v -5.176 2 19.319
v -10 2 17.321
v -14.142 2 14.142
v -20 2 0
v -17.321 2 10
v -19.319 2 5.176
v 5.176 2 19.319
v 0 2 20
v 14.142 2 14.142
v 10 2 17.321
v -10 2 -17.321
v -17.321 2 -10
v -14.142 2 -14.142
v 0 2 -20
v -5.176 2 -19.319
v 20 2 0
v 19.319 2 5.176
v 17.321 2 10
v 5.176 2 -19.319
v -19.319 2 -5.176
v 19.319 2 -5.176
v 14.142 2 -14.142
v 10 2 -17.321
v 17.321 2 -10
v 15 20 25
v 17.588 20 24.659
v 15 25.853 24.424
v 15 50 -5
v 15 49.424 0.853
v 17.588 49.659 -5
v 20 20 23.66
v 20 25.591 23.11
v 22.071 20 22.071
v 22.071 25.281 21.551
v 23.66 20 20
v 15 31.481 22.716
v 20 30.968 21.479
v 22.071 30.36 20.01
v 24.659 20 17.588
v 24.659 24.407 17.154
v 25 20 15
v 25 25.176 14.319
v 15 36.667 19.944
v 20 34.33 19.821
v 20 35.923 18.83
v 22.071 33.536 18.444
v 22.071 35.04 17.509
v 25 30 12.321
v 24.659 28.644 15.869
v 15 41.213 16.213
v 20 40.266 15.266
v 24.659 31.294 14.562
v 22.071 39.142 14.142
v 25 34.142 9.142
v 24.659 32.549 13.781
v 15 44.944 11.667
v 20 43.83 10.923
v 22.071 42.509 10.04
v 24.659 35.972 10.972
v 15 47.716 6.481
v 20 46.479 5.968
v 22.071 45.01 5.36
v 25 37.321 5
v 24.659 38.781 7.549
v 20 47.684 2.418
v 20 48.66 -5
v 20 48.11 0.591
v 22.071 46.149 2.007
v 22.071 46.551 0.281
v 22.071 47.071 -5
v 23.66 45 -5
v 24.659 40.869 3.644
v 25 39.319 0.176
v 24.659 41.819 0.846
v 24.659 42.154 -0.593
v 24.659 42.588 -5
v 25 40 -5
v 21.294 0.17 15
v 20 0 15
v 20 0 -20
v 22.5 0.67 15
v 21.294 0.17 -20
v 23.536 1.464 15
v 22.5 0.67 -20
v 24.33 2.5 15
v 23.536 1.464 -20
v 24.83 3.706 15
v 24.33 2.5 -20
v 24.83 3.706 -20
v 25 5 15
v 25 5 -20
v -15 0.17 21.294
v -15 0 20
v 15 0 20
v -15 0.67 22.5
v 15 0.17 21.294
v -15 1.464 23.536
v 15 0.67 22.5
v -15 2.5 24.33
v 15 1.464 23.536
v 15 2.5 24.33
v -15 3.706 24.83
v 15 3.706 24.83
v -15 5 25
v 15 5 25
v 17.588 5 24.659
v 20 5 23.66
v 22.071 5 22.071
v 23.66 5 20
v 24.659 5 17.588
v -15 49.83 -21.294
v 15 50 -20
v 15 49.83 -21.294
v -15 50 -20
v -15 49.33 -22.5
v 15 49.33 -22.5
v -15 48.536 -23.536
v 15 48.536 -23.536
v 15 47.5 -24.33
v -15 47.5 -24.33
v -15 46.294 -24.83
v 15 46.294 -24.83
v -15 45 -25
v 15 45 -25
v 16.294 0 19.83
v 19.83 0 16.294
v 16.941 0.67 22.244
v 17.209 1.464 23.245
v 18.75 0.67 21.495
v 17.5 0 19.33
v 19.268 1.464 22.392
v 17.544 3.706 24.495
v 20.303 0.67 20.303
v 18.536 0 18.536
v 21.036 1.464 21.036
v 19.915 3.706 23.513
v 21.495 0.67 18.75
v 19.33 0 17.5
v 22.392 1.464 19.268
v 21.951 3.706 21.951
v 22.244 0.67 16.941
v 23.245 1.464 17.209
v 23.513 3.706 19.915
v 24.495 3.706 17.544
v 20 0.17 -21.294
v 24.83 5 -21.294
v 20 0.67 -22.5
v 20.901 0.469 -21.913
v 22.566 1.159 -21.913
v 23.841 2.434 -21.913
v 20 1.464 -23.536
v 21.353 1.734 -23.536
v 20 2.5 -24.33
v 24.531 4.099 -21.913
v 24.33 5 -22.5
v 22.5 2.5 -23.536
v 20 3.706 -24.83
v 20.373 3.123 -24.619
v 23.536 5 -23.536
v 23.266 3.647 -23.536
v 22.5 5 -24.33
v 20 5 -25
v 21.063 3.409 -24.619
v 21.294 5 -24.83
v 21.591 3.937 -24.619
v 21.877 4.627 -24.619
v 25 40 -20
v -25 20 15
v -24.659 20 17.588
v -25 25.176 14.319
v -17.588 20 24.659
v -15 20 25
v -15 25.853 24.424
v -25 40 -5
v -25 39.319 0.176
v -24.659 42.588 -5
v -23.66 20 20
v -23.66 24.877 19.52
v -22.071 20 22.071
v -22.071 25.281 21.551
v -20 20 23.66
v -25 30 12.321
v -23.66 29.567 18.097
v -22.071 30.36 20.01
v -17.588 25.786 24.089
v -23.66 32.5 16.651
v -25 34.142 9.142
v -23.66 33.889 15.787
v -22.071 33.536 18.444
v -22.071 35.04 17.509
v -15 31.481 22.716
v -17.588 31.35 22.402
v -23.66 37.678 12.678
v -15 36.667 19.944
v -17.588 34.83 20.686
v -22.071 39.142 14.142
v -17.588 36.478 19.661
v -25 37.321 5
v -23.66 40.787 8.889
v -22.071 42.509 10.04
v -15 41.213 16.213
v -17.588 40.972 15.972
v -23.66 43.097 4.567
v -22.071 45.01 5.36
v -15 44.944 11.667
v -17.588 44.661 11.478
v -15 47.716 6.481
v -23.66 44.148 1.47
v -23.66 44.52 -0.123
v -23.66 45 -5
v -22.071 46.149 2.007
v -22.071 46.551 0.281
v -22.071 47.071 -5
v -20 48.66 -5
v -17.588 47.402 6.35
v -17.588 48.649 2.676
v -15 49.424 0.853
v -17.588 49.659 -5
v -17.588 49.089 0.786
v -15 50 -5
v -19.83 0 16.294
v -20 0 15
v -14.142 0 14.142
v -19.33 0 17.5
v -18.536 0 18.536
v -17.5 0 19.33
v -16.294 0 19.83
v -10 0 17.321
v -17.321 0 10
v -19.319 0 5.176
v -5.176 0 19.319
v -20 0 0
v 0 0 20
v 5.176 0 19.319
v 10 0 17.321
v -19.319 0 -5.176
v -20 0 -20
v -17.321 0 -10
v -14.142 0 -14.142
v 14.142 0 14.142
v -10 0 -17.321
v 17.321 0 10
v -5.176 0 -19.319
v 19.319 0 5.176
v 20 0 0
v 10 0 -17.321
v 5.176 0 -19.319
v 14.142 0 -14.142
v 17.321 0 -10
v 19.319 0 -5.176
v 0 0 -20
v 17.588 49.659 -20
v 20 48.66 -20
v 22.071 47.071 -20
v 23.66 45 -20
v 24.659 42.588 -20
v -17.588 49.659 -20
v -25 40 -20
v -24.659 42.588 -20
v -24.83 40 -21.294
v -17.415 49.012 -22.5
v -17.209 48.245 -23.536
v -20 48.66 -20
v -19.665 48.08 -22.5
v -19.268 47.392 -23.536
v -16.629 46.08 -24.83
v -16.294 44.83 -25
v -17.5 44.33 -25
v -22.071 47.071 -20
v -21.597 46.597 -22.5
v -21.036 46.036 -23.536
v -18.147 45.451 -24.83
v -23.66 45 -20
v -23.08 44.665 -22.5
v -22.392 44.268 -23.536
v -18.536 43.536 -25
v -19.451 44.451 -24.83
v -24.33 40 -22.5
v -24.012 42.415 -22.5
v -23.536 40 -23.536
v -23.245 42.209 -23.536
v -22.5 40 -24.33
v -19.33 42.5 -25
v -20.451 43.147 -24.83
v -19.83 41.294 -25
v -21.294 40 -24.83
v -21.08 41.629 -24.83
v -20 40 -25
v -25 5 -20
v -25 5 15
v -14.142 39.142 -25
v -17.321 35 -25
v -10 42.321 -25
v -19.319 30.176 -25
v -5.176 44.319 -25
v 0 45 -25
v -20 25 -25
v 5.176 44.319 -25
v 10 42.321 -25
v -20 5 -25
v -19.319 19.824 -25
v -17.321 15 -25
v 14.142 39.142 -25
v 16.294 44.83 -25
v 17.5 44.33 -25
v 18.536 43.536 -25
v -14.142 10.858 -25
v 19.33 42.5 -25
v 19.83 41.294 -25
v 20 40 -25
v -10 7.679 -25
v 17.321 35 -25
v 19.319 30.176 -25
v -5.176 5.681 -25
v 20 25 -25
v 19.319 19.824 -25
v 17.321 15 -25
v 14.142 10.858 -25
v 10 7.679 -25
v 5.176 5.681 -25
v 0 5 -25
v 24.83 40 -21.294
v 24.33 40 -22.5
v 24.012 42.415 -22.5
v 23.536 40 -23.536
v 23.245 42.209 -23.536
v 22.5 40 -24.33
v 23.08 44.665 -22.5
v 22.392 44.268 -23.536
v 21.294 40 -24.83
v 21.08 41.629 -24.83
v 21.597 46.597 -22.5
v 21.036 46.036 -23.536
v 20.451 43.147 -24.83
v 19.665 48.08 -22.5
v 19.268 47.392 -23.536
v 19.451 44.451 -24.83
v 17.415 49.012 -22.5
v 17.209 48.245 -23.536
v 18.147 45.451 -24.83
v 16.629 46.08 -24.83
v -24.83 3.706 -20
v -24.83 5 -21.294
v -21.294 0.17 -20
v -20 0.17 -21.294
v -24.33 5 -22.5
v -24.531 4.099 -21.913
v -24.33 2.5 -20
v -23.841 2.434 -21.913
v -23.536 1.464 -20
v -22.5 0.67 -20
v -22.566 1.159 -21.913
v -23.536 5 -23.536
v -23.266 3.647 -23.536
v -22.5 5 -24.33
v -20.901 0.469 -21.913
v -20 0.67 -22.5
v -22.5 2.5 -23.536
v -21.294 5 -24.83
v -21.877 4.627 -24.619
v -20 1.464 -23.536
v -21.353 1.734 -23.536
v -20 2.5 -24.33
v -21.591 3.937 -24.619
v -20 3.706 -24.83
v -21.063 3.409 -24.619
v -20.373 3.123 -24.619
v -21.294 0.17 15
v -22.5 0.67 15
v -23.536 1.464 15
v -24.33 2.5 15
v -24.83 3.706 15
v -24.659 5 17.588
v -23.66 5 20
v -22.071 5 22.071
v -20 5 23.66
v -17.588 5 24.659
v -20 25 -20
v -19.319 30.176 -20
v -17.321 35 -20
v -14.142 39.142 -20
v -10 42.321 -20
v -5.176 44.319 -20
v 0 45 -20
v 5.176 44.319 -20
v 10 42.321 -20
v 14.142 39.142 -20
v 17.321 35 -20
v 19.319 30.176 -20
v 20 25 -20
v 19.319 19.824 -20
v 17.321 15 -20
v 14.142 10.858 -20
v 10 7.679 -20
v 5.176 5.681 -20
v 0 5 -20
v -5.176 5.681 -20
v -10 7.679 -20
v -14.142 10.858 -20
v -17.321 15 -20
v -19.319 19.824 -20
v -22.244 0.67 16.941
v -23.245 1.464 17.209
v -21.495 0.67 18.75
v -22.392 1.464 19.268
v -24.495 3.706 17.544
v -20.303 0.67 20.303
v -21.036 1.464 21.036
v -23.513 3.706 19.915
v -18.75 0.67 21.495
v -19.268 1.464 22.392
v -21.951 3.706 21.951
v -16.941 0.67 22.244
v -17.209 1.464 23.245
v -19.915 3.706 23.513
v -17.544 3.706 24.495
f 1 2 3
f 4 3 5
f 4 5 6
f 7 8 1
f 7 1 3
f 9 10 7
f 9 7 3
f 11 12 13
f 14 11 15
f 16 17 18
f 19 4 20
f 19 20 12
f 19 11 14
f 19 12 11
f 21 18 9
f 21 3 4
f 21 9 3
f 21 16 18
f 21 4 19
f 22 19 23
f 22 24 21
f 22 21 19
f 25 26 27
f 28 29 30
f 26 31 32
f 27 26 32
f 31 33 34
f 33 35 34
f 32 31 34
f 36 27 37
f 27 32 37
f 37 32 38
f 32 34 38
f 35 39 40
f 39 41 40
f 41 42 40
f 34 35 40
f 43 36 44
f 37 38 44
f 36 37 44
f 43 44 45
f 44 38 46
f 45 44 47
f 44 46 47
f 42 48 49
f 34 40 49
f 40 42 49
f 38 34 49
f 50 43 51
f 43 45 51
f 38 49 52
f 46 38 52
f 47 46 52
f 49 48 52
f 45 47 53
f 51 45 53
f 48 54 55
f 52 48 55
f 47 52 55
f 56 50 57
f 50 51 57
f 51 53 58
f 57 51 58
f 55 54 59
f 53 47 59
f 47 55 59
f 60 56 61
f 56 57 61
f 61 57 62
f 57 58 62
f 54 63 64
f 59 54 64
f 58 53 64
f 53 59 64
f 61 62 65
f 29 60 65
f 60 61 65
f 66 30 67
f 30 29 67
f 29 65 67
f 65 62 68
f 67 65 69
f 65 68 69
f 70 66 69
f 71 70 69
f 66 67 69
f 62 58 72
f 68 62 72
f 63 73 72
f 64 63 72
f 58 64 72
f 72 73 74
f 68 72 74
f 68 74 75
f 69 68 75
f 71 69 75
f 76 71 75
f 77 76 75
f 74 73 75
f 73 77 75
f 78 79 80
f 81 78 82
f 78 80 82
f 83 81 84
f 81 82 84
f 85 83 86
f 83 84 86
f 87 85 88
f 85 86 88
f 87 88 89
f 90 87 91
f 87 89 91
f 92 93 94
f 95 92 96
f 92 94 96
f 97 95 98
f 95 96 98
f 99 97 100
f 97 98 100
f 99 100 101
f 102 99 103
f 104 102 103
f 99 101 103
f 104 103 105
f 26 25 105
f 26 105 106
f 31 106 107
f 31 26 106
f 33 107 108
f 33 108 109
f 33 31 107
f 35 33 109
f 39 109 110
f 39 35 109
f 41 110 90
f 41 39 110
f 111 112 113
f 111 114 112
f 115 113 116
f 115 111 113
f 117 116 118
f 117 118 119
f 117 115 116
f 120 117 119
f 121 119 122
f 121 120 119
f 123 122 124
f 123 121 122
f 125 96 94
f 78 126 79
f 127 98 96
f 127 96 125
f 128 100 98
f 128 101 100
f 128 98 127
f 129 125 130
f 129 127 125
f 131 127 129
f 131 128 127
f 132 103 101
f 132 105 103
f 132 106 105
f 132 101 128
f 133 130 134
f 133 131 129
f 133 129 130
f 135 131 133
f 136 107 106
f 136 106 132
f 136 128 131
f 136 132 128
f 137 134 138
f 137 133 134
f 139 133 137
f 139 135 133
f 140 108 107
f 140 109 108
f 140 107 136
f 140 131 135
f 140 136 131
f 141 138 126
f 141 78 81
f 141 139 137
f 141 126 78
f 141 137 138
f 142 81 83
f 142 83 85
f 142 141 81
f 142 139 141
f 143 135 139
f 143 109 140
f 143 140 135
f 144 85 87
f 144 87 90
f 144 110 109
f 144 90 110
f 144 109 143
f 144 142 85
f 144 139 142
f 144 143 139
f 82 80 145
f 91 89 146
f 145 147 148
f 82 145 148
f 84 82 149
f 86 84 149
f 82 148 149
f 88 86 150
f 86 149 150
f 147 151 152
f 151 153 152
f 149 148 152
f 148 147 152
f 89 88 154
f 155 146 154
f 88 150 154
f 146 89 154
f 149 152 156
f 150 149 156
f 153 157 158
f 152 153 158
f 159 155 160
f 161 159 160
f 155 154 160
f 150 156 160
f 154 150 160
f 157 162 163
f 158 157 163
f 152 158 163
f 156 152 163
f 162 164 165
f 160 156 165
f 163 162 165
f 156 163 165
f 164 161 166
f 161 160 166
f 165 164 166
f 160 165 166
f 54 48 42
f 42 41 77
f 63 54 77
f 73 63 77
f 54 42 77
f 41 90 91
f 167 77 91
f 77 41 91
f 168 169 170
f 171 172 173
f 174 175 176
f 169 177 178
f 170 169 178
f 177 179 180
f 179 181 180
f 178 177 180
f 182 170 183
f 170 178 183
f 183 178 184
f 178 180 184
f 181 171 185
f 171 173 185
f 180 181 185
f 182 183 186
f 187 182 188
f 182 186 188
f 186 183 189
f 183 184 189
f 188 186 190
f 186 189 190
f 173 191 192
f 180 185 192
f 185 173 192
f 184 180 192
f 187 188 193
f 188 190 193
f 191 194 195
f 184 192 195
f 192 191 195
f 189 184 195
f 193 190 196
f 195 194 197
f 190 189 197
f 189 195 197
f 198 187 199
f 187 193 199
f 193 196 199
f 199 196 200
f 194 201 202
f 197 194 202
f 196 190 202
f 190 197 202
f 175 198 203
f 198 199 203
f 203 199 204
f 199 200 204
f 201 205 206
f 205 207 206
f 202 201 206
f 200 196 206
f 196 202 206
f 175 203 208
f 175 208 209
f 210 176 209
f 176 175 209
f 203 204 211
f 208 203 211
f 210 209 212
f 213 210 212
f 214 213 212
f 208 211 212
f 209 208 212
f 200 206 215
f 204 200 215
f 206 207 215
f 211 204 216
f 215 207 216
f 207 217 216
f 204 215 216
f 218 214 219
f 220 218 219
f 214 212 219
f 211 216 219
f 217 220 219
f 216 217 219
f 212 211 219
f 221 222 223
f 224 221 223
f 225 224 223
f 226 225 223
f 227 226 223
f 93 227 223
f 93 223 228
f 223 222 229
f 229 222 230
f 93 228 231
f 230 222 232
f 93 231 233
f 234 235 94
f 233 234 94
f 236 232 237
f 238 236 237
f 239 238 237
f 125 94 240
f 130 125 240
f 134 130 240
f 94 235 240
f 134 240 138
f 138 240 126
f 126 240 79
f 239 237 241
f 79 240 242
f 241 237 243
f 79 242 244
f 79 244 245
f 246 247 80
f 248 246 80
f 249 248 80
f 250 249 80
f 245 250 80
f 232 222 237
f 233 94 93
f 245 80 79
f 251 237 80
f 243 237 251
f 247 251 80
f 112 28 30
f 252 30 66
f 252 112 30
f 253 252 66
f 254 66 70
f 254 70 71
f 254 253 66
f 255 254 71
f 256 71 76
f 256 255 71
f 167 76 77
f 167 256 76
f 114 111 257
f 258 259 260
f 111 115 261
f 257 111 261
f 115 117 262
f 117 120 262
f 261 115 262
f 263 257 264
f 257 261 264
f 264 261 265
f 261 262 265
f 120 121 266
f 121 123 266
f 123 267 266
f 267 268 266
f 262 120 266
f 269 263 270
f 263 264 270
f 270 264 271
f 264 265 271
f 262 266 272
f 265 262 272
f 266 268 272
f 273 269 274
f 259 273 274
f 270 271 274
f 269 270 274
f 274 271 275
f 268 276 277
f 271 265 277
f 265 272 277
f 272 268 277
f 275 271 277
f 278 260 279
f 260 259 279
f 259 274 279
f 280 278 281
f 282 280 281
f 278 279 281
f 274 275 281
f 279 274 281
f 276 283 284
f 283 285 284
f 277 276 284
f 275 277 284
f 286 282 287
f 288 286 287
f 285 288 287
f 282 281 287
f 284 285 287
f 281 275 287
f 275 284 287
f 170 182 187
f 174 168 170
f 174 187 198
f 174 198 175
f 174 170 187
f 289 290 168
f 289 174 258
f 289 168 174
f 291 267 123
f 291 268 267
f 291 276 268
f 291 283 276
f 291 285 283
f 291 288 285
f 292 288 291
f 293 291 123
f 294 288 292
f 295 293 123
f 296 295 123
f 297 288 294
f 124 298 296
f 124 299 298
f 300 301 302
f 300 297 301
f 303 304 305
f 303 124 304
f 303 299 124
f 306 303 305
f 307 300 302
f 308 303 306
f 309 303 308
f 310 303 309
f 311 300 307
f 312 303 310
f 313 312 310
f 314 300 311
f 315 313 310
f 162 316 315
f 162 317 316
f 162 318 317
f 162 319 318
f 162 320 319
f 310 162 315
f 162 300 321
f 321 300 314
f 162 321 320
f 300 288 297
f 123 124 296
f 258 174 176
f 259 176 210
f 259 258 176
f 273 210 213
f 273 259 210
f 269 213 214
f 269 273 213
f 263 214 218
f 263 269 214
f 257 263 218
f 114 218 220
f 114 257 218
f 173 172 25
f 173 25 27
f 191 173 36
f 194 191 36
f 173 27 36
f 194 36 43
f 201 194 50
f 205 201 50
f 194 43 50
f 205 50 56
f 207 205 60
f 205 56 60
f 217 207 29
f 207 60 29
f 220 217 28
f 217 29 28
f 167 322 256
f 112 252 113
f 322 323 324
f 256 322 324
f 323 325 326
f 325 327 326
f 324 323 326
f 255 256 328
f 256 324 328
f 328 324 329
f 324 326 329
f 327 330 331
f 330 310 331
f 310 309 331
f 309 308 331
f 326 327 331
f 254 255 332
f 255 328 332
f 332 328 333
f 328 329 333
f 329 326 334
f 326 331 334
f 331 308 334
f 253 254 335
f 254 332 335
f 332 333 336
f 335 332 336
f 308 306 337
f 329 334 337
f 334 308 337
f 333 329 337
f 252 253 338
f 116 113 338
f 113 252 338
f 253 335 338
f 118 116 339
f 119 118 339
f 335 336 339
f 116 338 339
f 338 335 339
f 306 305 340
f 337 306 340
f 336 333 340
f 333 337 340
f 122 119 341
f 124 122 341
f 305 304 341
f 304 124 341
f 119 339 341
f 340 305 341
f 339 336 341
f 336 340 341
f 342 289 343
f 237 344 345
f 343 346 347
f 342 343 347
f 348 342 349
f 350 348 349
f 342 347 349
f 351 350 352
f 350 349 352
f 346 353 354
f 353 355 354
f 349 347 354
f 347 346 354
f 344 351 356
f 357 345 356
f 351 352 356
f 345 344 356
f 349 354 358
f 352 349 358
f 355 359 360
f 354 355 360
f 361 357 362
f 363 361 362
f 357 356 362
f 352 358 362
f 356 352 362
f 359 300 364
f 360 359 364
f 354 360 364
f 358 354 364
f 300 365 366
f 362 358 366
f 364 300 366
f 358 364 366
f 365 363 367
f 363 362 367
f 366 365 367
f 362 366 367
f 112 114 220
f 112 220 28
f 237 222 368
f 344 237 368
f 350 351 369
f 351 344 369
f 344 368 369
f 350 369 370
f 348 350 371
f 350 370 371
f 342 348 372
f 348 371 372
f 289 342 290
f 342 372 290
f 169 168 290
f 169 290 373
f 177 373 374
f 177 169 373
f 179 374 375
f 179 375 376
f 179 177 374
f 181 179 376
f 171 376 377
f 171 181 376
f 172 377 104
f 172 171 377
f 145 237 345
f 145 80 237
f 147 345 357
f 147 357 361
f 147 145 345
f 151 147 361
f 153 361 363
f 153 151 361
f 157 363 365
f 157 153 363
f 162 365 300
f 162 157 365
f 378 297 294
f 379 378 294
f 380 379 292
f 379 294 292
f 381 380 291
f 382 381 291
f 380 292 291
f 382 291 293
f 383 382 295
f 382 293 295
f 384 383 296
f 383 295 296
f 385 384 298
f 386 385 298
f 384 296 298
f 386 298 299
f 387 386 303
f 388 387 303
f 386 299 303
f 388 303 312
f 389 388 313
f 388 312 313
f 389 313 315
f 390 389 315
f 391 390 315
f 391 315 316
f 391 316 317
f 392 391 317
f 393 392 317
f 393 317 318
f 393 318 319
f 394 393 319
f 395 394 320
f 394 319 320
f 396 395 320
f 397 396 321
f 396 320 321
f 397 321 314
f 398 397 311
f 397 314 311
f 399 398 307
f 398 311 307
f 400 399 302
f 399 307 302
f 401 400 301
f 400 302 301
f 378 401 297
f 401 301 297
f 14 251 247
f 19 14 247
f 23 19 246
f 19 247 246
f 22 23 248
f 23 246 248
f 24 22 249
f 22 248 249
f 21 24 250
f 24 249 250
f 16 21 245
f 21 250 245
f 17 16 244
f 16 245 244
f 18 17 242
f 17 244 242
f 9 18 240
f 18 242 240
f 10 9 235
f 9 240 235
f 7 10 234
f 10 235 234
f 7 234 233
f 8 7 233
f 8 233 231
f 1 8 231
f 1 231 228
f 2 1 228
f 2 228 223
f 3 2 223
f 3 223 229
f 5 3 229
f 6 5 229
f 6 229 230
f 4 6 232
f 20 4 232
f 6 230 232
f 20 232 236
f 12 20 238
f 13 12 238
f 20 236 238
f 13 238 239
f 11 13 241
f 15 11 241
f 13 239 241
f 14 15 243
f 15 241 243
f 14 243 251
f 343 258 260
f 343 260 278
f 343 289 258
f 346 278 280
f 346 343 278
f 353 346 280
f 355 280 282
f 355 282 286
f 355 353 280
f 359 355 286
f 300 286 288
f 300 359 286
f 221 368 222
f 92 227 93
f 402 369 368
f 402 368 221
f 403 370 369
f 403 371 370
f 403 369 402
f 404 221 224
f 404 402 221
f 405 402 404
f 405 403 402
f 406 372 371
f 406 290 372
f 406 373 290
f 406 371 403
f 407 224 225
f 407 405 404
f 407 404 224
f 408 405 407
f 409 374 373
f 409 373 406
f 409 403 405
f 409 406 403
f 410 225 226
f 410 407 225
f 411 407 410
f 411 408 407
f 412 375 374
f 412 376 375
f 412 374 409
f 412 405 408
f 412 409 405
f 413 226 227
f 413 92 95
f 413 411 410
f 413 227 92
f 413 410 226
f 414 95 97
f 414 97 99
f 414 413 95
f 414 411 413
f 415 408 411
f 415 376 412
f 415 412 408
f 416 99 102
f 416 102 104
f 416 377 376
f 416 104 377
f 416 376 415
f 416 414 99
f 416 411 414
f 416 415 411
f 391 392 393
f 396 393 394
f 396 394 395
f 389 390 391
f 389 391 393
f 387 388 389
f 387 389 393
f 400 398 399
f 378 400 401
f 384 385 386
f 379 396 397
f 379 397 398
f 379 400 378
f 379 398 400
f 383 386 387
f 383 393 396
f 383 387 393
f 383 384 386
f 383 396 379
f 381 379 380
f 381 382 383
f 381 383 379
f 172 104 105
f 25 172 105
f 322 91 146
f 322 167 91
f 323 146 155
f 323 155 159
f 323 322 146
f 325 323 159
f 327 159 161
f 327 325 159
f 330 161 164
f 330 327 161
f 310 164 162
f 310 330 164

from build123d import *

# Parameters (mm, degrees)
SKETCH1_W           = 50
SKETCH1_H           = 50
BOSS_EXTRUDE1_DEPTH = 50
SKETCH2_R           = 20
CUT_EXTRUDE1_DEPTH  = 5
SKETCH3_R           = 20
CUT_EXTRUDE5_DEPTH  = 2
FILLET10_R          = 30
FILLET11_R          = 10
FILLET12_R          = 10
FILLET15_R          = 5
FILLET16_R          = 5


with BuildPart() as part:
    # Sketch1 → Boss-Extrude1 (new body)
    with BuildSketch(Plane(origin=(0, 0, 0), x_dir=(1, 0, 0), z_dir=(0, 1, 0))):
        Rectangle(SKETCH1_W, SKETCH1_H)
    extrude(amount=BOSS_EXTRUDE1_DEPTH)

    # Sketch2 → Cut-Extrude1 (cut)
    with BuildSketch(Plane(origin=(0, 0, -25), x_dir=(-1, 0, 0), z_dir=(0, 0, -1))):
        with Locations((0, 25)):
            Circle(SKETCH2_R)
    extrude(amount=-CUT_EXTRUDE1_DEPTH, mode=Mode.SUBTRACT)

    # Sketch3 → Cut-Extrude5 (cut)
    with BuildSketch(Plane.XZ):
        with Locations(Location((0, 0, 0), (0, 0, 270))):
            Circle(SKETCH3_R)
    extrude(amount=-CUT_EXTRUDE5_DEPTH, mode=Mode.SUBTRACT)

    # Fillet10
    fillet10_edges = [part.edges().sort_by_distance(p)[0] for p in [
        (0, 50, 25),
    ]]
    fillet(fillet10_edges, radius=FILLET10_R)

    # Fillet11
    fillet11_edges = [part.edges().sort_by_distance(p)[0] for p in [
        (25, 50, -15),
        (25, 10, 25),
        (25, 41.213203436, 16.213203436),
    ]]
    fillet(fillet11_edges, radius=FILLET11_R)

    # Fillet12
    fillet12_edges = [part.edges().sort_by_distance(p)[0] for p in [
        (-25, 50, -15),
        (-25, 10, 25),
        (-25, 41.213203436, 16.213203436),
    ]]
    fillet(fillet12_edges, radius=FILLET12_R)

    # Fillet15
    fillet15_edges = [part.edges().sort_by_distance(p)[0] for p in [
        (25, 0, -5),
        (22.071067812, 0, 22.071067812),
        (0, 0, 25),
        (-22.071067812, 0, 22.071067812),
        (-25, 0, -5),
    ]]
    fillet(fillet15_edges, radius=FILLET15_R - 0.0001)  # a hair under: the kernel refuses the full size

    # Fillet16
    fillet16_edges = [part.edges().sort_by_distance(p)[0] for p in [
        (25, 22.49995, -25),
        (0, 50, -25),
        (22.071067812, 47.071067812, -25),
        (-25, 22.49995, -25),
        (-22.071067812, 47.071067812, -25),
        (0, 0, -25),
        (-23.535563195, 1.464436805, -25),
        (23.535563195, 1.464436805, -25),
    ]]
    fillet(fillet16_edges, radius=FILLET16_R - 0.0001)  # a hair under: the kernel refuses the full size


solid = part.part
